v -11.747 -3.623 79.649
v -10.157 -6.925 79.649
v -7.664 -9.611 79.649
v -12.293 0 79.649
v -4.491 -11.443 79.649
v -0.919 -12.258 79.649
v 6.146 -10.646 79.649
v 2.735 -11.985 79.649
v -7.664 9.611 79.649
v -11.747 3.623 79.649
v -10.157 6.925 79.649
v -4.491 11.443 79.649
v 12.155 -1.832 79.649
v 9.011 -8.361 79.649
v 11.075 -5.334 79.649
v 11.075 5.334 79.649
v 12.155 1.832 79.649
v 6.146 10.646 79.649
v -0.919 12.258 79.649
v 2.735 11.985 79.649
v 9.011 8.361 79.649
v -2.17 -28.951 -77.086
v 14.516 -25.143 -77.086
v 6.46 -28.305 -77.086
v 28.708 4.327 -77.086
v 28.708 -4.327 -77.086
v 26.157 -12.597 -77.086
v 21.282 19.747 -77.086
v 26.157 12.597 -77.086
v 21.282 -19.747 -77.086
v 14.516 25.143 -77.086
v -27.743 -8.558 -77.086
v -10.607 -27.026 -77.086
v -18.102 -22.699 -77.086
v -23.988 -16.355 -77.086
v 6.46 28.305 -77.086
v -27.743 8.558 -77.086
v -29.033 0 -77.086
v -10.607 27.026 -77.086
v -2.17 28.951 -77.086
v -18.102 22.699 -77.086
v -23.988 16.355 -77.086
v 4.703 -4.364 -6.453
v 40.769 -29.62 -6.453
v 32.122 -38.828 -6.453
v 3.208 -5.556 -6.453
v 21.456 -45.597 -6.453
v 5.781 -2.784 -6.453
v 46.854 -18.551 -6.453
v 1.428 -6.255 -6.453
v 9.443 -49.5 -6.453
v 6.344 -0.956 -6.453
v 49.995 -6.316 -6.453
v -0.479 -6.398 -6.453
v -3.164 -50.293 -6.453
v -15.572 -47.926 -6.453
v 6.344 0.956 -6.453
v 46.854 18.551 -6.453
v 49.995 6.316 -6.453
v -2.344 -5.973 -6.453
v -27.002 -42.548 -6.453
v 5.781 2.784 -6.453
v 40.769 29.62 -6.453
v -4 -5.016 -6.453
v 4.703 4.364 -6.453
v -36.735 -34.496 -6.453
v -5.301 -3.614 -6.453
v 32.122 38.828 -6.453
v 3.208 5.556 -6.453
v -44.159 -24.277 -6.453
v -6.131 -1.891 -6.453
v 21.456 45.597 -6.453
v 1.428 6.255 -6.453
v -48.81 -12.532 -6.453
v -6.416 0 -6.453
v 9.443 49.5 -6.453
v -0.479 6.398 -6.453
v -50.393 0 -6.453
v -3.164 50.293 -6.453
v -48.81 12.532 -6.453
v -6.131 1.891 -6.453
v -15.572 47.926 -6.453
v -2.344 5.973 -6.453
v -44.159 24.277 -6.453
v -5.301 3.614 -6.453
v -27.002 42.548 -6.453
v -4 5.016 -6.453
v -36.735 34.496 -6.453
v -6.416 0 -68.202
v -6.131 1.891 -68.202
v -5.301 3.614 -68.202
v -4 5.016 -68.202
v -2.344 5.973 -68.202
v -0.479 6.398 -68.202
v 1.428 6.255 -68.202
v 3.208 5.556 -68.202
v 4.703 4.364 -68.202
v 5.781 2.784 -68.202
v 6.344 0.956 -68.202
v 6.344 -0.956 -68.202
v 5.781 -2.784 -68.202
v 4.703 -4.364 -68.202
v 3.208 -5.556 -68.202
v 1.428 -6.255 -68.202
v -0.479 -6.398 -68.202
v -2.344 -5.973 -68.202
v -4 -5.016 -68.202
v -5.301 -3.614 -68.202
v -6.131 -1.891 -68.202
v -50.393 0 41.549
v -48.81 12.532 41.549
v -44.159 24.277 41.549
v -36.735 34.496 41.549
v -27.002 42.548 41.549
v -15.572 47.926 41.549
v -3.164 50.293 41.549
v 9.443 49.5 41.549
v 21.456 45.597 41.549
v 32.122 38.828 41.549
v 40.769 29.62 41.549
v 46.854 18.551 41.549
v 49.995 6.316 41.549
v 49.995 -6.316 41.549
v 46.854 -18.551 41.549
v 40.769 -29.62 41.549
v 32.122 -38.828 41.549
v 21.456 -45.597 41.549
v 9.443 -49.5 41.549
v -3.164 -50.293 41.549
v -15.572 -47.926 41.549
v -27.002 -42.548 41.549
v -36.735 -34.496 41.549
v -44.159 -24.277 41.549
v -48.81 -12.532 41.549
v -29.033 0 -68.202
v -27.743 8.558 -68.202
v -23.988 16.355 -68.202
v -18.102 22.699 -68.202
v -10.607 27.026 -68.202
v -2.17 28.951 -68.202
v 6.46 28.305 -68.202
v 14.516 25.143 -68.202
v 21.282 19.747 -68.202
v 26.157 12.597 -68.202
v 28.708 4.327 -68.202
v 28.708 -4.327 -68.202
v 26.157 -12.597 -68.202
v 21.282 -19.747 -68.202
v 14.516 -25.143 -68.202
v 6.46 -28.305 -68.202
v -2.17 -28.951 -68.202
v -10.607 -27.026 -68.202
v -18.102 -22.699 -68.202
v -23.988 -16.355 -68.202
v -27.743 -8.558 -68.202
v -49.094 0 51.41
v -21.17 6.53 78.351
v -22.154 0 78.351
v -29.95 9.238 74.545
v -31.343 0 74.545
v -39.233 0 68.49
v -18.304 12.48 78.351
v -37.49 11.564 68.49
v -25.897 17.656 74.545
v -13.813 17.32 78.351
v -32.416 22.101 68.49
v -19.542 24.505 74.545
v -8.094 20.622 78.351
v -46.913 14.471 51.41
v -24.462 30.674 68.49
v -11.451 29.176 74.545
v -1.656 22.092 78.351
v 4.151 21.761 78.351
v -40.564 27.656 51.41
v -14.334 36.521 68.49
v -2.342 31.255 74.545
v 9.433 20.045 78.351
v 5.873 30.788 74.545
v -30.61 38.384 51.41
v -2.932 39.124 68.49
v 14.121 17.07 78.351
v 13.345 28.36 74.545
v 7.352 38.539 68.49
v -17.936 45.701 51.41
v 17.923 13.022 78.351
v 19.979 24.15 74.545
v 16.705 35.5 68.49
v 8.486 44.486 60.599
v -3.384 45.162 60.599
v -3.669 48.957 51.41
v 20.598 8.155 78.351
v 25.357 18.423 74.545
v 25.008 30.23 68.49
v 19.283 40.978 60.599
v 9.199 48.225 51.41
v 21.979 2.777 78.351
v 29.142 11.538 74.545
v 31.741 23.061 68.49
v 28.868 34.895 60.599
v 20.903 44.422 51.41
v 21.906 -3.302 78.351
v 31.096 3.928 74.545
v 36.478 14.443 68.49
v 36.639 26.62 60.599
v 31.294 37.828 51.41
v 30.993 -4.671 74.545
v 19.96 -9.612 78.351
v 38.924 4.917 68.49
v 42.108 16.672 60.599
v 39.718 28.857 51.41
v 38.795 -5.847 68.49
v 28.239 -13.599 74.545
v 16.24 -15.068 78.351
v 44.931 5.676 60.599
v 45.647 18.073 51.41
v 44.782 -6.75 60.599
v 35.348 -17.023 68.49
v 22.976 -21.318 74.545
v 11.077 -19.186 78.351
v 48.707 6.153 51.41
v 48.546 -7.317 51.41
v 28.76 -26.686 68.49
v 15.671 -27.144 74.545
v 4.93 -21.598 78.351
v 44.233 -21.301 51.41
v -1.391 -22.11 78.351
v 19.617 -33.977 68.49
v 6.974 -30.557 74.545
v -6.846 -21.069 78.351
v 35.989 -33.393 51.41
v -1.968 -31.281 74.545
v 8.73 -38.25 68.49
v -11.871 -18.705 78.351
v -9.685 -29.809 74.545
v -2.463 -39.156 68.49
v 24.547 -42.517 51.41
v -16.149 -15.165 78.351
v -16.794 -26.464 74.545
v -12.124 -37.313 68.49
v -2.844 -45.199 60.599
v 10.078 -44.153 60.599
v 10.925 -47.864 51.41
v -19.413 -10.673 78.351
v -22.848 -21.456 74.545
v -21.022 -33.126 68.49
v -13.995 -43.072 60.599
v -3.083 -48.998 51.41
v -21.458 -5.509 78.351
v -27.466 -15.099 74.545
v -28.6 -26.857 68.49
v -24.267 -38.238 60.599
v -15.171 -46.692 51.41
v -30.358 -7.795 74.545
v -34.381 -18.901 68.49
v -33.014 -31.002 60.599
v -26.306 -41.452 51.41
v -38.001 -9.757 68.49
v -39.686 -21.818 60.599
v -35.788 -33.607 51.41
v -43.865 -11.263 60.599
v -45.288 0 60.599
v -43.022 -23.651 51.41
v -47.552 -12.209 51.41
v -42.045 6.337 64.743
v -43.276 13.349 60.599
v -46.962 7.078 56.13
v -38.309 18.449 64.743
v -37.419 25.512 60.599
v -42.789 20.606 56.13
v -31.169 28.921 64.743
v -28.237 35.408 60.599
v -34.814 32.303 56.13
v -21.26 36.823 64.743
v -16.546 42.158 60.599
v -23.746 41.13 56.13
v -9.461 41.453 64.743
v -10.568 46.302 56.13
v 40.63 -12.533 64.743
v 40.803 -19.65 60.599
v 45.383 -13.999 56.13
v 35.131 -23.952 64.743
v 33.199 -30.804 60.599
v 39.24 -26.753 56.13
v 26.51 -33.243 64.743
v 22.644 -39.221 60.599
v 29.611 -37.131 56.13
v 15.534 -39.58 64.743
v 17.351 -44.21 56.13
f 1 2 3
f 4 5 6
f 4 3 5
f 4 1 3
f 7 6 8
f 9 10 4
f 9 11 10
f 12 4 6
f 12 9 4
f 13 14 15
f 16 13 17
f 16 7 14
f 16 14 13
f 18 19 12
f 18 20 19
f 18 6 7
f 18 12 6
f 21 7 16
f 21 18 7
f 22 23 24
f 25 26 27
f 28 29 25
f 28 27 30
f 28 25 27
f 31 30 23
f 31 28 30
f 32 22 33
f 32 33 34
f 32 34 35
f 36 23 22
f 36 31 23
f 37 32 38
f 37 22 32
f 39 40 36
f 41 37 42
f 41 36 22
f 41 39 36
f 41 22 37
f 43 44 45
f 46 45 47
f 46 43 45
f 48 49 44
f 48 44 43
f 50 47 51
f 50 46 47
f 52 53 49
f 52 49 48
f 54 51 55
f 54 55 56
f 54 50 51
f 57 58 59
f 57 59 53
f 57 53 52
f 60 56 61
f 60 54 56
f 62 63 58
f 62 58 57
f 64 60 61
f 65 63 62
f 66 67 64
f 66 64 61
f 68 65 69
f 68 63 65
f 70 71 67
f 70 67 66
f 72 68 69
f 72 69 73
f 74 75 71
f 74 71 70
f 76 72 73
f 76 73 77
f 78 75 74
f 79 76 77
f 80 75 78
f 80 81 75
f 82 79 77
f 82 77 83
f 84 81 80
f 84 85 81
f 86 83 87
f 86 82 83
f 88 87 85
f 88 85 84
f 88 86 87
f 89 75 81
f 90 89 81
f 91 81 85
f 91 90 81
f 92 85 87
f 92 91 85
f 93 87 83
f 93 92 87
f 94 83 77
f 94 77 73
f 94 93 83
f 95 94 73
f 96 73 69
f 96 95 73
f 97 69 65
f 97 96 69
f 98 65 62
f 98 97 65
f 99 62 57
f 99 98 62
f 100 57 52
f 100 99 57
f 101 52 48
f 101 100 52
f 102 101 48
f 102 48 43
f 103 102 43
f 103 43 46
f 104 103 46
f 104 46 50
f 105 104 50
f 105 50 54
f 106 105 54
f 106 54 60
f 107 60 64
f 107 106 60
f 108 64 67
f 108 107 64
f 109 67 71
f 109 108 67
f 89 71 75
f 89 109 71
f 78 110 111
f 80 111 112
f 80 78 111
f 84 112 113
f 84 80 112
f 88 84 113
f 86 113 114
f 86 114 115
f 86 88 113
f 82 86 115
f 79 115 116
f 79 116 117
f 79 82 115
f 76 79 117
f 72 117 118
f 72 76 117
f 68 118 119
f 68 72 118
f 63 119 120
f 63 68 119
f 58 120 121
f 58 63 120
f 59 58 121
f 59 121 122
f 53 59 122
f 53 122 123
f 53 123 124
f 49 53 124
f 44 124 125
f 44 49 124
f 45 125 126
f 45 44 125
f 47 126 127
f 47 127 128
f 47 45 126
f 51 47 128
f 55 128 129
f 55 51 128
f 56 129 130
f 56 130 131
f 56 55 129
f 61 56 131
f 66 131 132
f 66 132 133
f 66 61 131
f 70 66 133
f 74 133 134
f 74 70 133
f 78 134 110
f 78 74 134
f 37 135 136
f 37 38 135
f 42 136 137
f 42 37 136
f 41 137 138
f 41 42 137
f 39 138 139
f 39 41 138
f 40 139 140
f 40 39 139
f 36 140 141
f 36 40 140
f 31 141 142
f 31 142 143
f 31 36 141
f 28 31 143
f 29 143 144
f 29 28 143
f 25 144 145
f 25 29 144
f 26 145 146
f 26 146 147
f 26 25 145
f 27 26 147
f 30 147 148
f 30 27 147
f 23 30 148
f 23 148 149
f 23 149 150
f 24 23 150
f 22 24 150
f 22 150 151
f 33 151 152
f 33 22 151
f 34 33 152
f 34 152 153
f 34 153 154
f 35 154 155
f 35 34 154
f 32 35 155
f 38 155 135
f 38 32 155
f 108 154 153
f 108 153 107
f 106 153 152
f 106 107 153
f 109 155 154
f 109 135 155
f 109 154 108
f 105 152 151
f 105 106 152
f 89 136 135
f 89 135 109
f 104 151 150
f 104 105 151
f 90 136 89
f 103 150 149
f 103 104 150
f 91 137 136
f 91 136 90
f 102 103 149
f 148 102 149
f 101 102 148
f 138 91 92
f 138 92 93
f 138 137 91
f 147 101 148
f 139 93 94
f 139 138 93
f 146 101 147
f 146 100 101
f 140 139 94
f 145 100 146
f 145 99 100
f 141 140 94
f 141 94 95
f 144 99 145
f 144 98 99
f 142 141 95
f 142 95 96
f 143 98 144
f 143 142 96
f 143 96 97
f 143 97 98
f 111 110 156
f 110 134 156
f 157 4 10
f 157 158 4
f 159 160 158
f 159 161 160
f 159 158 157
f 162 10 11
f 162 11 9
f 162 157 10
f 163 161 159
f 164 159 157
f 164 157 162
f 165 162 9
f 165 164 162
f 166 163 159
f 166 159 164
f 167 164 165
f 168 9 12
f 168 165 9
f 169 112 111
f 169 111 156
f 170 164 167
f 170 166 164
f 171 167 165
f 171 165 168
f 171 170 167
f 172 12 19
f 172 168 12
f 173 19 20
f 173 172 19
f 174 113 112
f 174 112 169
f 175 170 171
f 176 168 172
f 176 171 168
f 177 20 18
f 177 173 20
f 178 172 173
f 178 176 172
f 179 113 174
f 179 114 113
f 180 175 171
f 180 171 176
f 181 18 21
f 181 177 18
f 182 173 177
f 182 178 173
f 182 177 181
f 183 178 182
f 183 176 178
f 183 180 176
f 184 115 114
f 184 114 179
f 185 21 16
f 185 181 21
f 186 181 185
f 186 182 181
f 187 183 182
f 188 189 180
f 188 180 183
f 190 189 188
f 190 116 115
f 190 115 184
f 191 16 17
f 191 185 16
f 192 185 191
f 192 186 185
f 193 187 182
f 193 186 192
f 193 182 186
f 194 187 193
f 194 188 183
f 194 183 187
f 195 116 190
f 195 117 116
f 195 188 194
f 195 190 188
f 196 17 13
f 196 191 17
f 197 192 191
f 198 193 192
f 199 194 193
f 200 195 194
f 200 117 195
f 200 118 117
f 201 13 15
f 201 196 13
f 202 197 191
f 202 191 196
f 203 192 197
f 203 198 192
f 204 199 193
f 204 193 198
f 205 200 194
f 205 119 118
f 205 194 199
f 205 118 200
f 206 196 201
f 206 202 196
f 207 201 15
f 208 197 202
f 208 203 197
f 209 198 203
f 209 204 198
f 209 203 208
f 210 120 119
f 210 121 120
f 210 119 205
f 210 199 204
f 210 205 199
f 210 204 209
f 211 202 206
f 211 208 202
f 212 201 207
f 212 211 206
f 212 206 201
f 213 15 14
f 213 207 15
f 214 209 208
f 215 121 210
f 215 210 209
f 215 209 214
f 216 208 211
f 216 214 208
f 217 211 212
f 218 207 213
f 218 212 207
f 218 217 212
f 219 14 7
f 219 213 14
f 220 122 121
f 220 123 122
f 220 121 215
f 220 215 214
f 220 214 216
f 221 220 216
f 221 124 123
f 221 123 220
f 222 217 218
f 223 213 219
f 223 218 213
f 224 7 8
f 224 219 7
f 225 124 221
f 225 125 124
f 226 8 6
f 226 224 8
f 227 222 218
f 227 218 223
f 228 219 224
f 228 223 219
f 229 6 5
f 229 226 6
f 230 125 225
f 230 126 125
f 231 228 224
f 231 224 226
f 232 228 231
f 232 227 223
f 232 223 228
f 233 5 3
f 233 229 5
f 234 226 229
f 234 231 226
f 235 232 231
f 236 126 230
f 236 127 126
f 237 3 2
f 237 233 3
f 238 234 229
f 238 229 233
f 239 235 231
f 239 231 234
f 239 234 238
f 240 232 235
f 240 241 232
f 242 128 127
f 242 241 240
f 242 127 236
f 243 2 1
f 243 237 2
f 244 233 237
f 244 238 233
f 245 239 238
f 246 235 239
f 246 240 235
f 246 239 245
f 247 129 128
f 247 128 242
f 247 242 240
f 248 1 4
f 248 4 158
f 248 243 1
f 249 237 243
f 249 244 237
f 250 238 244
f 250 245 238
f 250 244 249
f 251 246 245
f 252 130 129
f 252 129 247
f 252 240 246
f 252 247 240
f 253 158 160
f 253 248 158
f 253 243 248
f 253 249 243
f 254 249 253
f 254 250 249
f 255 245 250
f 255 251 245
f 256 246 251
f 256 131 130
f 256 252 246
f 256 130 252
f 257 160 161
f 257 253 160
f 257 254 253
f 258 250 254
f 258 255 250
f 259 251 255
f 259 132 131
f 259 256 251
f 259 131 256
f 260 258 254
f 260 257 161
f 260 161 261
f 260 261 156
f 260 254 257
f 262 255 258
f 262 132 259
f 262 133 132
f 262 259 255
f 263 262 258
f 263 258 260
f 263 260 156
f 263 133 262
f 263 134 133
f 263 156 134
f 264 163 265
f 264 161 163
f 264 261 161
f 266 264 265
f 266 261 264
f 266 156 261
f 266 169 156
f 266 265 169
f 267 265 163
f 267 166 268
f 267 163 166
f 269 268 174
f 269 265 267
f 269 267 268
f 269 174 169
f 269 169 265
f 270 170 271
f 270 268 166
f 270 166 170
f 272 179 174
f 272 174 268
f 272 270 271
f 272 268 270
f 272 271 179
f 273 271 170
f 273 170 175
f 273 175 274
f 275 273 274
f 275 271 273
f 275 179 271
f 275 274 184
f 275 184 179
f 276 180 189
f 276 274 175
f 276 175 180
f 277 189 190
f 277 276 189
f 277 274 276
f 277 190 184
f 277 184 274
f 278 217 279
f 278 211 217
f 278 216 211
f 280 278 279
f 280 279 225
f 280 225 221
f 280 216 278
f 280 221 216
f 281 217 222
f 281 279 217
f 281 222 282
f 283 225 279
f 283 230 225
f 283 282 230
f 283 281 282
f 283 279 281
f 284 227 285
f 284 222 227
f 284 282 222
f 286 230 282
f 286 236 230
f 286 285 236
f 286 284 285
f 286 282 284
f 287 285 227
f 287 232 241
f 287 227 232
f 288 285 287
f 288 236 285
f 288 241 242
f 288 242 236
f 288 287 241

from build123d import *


with BuildPart() as f1:
    # F0 (on Front) → F1 (revolve)
    with BuildSketch(Plane.XZ):
        with BuildLine():
            Line((-29.032616, -77.086337), (0, -77.086337))
            Line((0, -77.086337), (0, 79.64943))
            Line((0, 79.64943), (-12.292725, 79.64943))
            ThreePointArc((-12.292725, 79.64943), (-39.233493, 68.490199), (-50.392725, 41.54943))
            Line((-50.392725, 41.54943), (-50.392725, -6.453492))
            Line((-50.392725, -6.453492), (-6.416031, -6.453492))
            Line((-6.416031, -6.453492), (-6.416031, -68.201698))
            Line((-6.416031, -68.201698), (-29.032616, -68.201698))
            Line((-29.032616, -68.201698), (-29.032616, -77.086337))
        make_face()
    revolve(axis=Axis((0, 0, 1.281547), (0, 0, -1)))


solid = f1.part
